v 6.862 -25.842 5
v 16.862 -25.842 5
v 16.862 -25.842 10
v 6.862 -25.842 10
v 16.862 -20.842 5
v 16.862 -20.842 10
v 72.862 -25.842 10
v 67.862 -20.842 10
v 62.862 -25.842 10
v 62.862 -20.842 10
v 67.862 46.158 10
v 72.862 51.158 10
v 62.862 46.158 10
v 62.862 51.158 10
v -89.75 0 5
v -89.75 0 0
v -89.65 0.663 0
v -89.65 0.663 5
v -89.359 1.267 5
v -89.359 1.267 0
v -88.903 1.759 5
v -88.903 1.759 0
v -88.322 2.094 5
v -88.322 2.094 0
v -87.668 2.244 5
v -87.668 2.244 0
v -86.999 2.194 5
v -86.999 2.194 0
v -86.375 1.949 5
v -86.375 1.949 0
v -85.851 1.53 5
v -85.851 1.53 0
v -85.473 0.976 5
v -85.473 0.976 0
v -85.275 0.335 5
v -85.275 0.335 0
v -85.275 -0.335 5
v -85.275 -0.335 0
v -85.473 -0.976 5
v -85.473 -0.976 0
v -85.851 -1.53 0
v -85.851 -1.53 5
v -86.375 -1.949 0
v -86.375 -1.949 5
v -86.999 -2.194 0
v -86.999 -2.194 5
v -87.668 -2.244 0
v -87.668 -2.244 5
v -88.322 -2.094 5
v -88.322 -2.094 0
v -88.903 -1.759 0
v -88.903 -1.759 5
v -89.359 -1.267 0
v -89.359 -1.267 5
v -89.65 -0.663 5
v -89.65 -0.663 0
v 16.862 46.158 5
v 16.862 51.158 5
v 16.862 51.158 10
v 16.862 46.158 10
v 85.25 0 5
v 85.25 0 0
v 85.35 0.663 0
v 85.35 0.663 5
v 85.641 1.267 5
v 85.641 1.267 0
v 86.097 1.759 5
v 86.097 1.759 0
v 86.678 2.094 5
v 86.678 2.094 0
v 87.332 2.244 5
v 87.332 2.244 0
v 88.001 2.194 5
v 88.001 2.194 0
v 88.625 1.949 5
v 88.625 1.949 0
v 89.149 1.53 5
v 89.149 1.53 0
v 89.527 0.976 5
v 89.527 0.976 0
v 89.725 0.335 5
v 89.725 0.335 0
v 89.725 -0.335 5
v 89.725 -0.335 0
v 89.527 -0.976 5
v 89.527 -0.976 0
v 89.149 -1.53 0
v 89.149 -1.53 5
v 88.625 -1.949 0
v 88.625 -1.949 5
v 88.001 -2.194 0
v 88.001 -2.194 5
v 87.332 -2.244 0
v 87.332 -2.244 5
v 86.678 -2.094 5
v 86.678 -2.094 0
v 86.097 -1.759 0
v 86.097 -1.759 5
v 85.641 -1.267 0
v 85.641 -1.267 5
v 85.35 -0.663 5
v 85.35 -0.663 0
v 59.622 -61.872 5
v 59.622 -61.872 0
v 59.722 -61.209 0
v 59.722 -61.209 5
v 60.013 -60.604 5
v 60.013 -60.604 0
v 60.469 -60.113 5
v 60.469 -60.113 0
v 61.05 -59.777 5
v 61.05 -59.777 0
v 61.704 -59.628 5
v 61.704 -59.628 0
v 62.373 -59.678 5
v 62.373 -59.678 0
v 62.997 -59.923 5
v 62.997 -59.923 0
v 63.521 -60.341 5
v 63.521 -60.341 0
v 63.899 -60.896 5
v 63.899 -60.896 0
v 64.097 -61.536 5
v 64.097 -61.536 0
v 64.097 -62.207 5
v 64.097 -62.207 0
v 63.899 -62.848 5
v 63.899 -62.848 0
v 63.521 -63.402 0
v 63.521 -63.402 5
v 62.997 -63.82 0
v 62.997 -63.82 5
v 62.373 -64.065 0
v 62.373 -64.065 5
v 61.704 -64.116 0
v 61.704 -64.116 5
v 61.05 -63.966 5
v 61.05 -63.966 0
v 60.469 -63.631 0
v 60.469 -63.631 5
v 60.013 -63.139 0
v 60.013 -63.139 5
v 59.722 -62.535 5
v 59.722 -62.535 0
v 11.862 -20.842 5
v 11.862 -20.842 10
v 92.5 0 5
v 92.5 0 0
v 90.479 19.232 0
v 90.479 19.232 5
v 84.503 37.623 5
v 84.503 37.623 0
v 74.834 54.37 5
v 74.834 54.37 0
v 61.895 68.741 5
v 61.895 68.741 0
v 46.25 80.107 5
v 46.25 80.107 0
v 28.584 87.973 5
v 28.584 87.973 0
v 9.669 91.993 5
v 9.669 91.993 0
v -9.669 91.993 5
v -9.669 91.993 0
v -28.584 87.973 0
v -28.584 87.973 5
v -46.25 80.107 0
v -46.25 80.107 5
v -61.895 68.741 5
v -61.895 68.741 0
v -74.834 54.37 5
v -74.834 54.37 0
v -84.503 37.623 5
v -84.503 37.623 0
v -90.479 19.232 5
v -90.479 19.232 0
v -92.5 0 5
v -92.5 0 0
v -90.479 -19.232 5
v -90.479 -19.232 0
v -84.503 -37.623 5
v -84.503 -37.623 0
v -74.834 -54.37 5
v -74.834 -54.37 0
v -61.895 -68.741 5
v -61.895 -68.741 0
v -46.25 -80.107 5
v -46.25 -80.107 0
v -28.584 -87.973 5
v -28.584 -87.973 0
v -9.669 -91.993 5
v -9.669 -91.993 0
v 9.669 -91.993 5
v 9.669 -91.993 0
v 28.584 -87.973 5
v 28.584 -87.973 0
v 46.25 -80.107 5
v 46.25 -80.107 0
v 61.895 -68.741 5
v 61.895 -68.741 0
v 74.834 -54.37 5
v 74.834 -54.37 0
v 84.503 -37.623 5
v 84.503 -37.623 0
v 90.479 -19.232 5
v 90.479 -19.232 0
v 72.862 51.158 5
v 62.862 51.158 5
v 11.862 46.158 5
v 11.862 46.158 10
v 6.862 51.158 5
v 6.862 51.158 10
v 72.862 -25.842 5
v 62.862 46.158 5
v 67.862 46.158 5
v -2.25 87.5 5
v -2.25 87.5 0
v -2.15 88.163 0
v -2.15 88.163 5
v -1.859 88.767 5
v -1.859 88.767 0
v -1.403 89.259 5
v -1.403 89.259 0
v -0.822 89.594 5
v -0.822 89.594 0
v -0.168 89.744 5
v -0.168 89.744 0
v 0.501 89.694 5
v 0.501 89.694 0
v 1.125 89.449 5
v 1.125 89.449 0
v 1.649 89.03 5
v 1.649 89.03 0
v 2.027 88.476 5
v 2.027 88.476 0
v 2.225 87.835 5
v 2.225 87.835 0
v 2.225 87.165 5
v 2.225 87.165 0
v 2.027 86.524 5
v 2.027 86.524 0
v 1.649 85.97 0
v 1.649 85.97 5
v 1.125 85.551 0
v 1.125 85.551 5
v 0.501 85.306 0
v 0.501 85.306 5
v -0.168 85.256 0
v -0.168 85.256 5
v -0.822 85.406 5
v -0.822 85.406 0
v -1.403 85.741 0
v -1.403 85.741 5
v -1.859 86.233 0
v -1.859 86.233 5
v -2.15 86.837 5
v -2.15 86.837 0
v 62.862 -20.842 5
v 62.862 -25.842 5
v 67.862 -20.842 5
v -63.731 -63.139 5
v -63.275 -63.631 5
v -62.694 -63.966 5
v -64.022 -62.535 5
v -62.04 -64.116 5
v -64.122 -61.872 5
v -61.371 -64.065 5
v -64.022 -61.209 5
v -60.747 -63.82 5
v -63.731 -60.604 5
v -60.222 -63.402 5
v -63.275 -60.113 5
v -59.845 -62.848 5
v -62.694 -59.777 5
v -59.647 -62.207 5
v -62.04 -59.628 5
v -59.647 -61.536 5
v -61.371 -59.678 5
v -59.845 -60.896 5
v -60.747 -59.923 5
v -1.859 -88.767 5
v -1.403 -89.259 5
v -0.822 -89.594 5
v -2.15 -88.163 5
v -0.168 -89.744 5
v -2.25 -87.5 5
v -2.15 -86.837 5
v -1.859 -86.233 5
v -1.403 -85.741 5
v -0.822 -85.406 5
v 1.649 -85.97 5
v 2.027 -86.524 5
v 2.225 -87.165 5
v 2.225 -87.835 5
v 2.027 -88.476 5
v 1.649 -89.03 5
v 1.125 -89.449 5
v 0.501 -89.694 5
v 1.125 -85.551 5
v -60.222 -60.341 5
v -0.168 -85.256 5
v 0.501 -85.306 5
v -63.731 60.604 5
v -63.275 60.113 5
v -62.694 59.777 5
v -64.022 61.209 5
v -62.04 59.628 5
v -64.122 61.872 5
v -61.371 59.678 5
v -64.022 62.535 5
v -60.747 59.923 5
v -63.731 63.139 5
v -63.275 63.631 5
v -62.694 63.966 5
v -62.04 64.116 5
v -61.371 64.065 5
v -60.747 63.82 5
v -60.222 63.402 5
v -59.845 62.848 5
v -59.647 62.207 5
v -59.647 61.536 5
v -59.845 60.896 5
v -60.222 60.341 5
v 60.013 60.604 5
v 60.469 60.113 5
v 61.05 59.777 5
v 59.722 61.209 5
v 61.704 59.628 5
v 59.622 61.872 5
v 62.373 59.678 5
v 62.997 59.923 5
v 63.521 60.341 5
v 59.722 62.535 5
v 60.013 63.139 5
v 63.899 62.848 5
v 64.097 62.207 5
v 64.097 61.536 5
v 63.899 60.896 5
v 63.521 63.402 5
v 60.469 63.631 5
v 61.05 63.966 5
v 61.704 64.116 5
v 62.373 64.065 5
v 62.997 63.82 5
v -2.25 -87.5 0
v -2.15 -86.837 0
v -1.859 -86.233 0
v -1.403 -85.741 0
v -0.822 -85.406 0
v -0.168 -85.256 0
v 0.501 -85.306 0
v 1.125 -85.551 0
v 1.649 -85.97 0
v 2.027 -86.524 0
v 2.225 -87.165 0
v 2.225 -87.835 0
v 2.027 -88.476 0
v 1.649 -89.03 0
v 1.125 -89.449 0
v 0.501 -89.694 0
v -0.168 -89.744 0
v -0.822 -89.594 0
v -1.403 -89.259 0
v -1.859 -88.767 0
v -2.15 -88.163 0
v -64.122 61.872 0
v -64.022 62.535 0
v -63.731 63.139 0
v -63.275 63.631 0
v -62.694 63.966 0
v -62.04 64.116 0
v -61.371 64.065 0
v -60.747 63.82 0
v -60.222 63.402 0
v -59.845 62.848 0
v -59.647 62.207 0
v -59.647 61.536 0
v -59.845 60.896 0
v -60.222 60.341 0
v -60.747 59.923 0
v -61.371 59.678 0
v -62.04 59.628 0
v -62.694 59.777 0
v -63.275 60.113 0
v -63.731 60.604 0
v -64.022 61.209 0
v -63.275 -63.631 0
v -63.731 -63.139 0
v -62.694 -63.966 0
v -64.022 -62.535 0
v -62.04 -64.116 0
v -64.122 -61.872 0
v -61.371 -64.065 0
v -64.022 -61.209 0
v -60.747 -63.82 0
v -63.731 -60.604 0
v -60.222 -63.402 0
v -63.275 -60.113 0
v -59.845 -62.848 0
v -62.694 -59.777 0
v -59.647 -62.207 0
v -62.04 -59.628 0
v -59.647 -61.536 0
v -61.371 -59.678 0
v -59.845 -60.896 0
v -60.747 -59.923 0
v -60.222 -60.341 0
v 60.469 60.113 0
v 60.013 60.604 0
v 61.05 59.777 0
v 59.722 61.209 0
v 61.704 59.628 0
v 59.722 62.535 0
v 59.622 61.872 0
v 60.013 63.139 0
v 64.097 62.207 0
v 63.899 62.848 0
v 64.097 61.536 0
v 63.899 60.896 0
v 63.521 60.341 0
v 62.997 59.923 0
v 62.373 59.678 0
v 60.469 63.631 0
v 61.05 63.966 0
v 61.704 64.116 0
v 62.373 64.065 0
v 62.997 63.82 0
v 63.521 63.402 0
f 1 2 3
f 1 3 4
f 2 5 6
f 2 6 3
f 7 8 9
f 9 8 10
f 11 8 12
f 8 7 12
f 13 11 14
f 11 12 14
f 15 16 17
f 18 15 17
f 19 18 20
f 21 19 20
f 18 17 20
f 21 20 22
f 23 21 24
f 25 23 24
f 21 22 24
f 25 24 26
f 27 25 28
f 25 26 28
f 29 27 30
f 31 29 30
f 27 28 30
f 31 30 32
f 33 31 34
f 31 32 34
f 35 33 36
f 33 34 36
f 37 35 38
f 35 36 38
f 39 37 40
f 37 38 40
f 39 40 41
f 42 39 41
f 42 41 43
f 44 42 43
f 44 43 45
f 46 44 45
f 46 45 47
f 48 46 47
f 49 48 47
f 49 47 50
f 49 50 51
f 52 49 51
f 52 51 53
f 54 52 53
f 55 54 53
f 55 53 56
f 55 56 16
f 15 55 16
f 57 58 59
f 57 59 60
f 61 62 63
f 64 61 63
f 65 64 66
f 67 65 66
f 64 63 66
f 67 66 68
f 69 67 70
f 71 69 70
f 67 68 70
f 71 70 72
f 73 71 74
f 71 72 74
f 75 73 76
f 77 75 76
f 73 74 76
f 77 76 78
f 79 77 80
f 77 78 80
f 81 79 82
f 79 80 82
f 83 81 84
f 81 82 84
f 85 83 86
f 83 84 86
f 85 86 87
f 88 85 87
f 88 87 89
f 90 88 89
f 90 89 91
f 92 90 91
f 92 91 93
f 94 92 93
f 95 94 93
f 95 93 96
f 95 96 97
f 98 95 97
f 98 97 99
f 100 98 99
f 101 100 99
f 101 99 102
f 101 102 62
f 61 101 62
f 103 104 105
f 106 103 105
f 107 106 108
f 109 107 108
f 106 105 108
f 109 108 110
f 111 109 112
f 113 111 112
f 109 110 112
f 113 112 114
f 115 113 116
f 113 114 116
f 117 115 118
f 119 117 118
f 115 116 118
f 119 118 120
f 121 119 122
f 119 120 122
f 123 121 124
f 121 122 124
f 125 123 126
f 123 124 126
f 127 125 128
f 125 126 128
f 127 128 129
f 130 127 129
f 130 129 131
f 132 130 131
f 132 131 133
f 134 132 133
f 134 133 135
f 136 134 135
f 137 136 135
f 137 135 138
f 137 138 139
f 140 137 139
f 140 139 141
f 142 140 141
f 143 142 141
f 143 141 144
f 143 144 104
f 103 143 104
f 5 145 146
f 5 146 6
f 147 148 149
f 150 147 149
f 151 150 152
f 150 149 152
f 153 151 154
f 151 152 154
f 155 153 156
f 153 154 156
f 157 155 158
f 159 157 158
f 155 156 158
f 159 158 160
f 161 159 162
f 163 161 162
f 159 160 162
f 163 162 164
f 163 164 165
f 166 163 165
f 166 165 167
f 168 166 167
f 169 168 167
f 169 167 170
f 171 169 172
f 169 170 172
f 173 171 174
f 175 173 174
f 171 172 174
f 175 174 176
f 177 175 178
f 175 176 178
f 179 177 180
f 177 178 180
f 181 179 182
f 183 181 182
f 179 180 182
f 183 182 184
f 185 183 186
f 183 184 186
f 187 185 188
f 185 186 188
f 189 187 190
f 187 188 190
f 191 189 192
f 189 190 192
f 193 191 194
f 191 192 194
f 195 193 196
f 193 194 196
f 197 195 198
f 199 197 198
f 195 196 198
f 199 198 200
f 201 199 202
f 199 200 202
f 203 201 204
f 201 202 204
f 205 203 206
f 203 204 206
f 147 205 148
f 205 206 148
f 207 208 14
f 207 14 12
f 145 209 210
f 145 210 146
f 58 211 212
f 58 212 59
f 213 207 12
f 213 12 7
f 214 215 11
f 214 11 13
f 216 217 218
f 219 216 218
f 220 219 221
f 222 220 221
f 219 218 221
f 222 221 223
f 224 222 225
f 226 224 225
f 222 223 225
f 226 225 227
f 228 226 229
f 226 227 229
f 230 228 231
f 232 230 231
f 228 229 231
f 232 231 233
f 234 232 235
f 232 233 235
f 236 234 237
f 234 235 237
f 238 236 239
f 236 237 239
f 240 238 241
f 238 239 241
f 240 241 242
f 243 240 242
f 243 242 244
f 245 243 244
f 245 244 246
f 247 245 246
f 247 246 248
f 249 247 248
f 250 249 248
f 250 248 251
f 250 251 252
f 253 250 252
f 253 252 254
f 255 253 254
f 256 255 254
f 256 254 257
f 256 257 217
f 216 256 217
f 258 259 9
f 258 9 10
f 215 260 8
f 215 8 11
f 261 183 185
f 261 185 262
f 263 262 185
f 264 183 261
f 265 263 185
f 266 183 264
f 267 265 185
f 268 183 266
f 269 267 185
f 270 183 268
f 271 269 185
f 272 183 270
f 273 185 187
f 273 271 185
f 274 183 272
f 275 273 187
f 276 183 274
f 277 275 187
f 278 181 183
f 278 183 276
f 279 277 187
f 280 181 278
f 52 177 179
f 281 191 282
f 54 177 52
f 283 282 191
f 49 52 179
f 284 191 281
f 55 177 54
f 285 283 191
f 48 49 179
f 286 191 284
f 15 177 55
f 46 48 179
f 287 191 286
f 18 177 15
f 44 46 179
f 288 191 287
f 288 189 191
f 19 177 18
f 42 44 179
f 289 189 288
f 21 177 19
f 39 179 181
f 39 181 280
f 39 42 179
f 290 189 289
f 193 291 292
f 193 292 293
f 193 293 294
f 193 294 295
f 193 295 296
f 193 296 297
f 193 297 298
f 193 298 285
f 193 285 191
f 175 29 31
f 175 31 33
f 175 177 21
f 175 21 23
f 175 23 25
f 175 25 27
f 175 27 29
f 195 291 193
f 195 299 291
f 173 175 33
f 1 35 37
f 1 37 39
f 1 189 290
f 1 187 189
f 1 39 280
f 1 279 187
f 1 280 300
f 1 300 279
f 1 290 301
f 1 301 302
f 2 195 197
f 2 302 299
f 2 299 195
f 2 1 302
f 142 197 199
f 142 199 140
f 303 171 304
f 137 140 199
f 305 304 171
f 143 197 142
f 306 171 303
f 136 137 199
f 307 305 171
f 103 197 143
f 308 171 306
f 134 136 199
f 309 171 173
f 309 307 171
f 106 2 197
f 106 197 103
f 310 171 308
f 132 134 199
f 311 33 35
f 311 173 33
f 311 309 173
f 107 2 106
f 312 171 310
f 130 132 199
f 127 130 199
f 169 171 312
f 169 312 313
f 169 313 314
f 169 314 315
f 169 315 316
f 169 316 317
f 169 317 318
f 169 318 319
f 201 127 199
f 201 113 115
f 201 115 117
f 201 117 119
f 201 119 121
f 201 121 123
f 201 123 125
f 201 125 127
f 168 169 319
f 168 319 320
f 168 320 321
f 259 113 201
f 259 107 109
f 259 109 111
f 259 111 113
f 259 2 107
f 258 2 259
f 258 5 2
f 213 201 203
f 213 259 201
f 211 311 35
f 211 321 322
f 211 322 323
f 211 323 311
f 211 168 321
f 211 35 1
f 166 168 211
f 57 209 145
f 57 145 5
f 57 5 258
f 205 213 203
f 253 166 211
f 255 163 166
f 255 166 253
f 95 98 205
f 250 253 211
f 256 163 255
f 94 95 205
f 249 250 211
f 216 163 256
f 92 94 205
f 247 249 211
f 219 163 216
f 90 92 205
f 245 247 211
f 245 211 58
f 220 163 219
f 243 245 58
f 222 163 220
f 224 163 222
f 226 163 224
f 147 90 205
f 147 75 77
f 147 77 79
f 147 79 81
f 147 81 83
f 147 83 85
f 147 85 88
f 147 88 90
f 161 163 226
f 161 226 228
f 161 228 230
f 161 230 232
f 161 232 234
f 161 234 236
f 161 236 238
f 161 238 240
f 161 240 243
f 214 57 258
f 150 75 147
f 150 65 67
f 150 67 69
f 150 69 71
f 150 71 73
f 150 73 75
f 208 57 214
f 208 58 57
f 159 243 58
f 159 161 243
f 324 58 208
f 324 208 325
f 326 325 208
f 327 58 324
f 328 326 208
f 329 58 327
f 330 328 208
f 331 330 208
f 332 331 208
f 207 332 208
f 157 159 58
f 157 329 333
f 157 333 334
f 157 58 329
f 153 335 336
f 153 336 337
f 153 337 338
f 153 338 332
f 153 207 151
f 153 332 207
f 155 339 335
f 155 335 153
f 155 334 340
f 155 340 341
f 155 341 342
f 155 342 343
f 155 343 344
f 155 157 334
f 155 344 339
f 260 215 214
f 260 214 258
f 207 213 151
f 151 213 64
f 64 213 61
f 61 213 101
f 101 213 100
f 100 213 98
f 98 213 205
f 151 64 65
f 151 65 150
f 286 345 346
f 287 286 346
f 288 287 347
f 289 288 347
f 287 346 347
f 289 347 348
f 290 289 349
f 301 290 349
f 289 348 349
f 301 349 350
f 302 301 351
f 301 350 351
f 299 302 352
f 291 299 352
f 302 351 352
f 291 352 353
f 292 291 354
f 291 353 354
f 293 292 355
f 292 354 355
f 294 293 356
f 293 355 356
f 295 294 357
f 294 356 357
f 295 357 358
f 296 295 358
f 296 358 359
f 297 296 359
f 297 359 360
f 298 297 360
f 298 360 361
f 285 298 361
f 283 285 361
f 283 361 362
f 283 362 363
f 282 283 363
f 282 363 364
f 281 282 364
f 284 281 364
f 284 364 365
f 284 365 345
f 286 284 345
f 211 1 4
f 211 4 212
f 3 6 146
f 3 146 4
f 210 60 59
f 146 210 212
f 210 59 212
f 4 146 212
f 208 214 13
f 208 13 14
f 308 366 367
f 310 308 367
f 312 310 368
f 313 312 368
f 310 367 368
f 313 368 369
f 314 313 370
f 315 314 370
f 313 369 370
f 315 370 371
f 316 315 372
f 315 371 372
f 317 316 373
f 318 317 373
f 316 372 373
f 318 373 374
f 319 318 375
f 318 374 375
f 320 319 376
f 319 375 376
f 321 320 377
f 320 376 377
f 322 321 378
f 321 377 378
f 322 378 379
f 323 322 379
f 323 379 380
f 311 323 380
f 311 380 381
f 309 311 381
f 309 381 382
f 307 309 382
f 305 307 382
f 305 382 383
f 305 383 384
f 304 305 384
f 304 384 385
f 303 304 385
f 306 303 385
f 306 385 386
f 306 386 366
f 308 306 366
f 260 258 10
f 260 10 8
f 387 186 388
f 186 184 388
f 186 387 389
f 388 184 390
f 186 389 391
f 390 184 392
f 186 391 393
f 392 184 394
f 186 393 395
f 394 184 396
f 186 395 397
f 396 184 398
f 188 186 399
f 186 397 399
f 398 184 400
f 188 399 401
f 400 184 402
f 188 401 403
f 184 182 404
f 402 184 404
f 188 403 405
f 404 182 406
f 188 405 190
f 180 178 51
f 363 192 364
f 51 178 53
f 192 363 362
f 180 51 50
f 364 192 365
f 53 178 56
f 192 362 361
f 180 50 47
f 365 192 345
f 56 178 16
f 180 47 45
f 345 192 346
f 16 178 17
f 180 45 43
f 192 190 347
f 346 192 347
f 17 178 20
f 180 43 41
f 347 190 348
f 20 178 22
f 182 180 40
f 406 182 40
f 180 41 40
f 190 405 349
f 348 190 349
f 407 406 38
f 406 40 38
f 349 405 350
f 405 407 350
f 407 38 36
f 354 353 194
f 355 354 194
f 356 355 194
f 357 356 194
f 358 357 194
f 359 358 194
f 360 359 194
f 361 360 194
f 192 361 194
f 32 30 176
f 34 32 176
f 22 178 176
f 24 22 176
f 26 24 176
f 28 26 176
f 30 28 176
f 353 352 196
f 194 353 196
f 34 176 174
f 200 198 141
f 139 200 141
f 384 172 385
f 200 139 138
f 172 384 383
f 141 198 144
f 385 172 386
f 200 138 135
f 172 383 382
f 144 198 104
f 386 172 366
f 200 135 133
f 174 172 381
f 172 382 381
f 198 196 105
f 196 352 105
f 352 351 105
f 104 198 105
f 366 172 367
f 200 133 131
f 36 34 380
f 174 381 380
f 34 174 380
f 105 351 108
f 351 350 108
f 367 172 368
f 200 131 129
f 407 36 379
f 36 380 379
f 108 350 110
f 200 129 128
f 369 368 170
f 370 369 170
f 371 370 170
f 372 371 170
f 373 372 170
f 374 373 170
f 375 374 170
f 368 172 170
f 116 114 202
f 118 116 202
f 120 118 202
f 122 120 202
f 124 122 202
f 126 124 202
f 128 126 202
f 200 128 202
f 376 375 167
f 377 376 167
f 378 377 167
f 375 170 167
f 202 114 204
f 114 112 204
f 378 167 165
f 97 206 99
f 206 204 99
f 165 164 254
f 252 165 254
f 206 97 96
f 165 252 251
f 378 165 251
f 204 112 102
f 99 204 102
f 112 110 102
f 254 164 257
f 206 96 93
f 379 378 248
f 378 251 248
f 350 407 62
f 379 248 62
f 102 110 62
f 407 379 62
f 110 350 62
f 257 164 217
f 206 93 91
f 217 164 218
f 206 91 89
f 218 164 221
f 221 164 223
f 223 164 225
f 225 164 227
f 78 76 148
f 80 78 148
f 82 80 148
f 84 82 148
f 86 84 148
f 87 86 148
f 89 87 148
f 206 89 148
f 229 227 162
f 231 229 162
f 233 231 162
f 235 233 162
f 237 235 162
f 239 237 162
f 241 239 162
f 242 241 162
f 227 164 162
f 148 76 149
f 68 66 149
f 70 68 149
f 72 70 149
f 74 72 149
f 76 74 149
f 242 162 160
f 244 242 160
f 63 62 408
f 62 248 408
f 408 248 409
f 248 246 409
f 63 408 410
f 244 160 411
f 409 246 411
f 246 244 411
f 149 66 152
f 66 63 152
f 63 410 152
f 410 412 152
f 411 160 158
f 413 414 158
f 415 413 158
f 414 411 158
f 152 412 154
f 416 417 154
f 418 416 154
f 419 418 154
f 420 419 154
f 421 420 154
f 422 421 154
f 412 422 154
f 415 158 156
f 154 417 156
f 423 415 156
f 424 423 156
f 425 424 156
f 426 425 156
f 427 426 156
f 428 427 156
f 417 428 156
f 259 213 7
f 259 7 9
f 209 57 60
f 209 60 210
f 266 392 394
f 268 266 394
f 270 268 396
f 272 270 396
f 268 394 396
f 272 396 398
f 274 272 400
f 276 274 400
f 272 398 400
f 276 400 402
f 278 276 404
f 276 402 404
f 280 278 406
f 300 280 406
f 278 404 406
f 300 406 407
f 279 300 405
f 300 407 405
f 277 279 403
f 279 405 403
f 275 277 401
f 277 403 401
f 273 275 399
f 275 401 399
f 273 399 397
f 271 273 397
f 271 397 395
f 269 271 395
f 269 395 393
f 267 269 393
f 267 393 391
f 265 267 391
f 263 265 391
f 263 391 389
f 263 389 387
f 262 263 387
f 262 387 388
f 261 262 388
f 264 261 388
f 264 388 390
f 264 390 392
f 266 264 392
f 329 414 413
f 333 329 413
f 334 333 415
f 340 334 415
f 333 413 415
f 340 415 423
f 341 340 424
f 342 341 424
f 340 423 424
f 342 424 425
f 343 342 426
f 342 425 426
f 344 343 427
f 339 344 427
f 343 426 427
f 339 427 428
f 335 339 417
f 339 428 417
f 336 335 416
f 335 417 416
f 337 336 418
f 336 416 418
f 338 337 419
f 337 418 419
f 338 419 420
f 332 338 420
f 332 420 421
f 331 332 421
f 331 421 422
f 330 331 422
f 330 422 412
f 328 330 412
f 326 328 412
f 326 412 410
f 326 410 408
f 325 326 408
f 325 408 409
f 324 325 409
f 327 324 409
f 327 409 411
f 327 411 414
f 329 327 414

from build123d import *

# Parameters (mm, degrees)
SKETCH1_R           = 92.5
BOSS_EXTRUDE1_DEPTH = 5
BOSS_EXTRUDE2_DEPTH = 5
CUT_EXTRUDE4_REACH  = 12
SKETCH13_R          = 2.25


with BuildPart() as part:
    # Sketch1 → Boss-Extrude1 (new body)
    with BuildSketch(Plane.XY):
        Circle(SKETCH1_R)
    extrude(amount=BOSS_EXTRUDE1_DEPTH)

    # Sketch12 → Boss-Extrude2 (add)
    with BuildSketch(Plane.XY.offset(5)):
        Polygon((62.861769108, -20.84153395), (67.861769108, -20.84153395), (67.861769108, 46.15846605), (62.861769108, 46.15846605), (62.861769108, 51.15846605), (72.861769108, 51.15846605), (72.861769108, -25.84153395), (62.861769108, -25.84153395), align=None)
        Polygon((11.861769105, 46.15846605), (11.861769105, -20.84153395), (16.861769105, -20.84153395), (16.861769105, -25.84153395), (6.861769105, -25.84153395), (6.861769105, 51.15846605), (16.861769105, 51.15846605), (16.861769105, 46.15846605), align=None)
    extrude(amount=BOSS_EXTRUDE2_DEPTH)

    # Sketch13 → Cut-Extrude4 (cut, up to next)
    with BuildSketch(Plane(origin=(0, 0, 0), x_dir=(-1, 0, 0), z_dir=(0, 0, -1)), mode=Mode.PRIVATE) as cut_extrude4_sk1:
        with Locations((-87.5, 0)):
            Circle(SKETCH13_R)
    cut_extrude4_tool1 = extrude(cut_extrude4_sk1.sketch, amount=-CUT_EXTRUDE4_REACH, mode=Mode.PRIVATE) & part.part
    add(cut_extrude4_tool1.solids().sort_by_distance((87.5, 0, 0))[0], mode=Mode.SUBTRACT)
    # Sketch13 → Cut-Extrude4 (cut, up to next)
    with BuildSketch(Plane(origin=(0, 0, 0), x_dir=(-1, 0, 0), z_dir=(0, 0, -1)), mode=Mode.PRIVATE) as cut_extrude4_sk2:
        with Locations((-61.871843354, 61.871843354)):
            Circle(SKETCH13_R)
    cut_extrude4_tool2 = extrude(cut_extrude4_sk2.sketch, amount=-CUT_EXTRUDE4_REACH, mode=Mode.PRIVATE) & part.part
    add(cut_extrude4_tool2.solids().sort_by_distance((61.871843, 61.871843, 0))[0], mode=Mode.SUBTRACT)
    # Sketch13 → Cut-Extrude4 (cut, up to next)
    with BuildSketch(Plane(origin=(0, 0, 0), x_dir=(-1, 0, 0), z_dir=(0, 0, -1)), mode=Mode.PRIVATE) as cut_extrude4_sk3:
        with Locations((0, 87.5)):
            Circle(SKETCH13_R)
    cut_extrude4_tool3 = extrude(cut_extrude4_sk3.sketch, amount=-CUT_EXTRUDE4_REACH, mode=Mode.PRIVATE) & part.part
    add(cut_extrude4_tool3.solids().sort_by_distance((0, 87.5, 0))[0], mode=Mode.SUBTRACT)
    # Sketch13 → Cut-Extrude4 (cut, up to next)
    with BuildSketch(Plane(origin=(0, 0, 0), x_dir=(-1, 0, 0), z_dir=(0, 0, -1)), mode=Mode.PRIVATE) as cut_extrude4_sk4:
        with Locations((61.871843354, 61.871843354)):
            Circle(SKETCH13_R)
    cut_extrude4_tool4 = extrude(cut_extrude4_sk4.sketch, amount=-CUT_EXTRUDE4_REACH, mode=Mode.PRIVATE) & part.part
    add(cut_extrude4_tool4.solids().sort_by_distance((-61.871843, 61.871843, 0))[0], mode=Mode.SUBTRACT)
    # Sketch13 → Cut-Extrude4 (cut, up to next)
    with BuildSketch(Plane(origin=(0, 0, 0), x_dir=(-1, 0, 0), z_dir=(0, 0, -1)), mode=Mode.PRIVATE) as cut_extrude4_sk5:
        with Locations((87.5, 0)):
            Circle(SKETCH13_R)
    cut_extrude4_tool5 = extrude(cut_extrude4_sk5.sketch, amount=-CUT_EXTRUDE4_REACH, mode=Mode.PRIVATE) & part.part
    add(cut_extrude4_tool5.solids().sort_by_distance((-87.5, 0, 0))[0], mode=Mode.SUBTRACT)
    # Sketch13 → Cut-Extrude4 (cut, up to next)
    with BuildSketch(Plane(origin=(0, 0, 0), x_dir=(-1, 0, 0), z_dir=(0, 0, -1)), mode=Mode.PRIVATE) as cut_extrude4_sk6:
        with Locations((61.871843354, -61.871843354)):
            Circle(SKETCH13_R)
    cut_extrude4_tool6 = extrude(cut_extrude4_sk6.sketch, amount=-CUT_EXTRUDE4_REACH, mode=Mode.PRIVATE) & part.part
    add(cut_extrude4_tool6.solids().sort_by_distance((-61.871843, -61.871843, 0))[0], mode=Mode.SUBTRACT)
    # Sketch13 → Cut-Extrude4 (cut, up to next)
    with BuildSketch(Plane(origin=(0, 0, 0), x_dir=(-1, 0, 0), z_dir=(0, 0, -1)), mode=Mode.PRIVATE) as cut_extrude4_sk7:
        with Locations((0, -87.5)):
            Circle(SKETCH13_R)
    cut_extrude4_tool7 = extrude(cut_extrude4_sk7.sketch, amount=-CUT_EXTRUDE4_REACH, mode=Mode.PRIVATE) & part.part
    add(cut_extrude4_tool7.solids().sort_by_distance((0, -87.5, 0))[0], mode=Mode.SUBTRACT)
    # Sketch13 → Cut-Extrude4 (cut, up to next)
    with BuildSketch(Plane(origin=(0, 0, 0), x_dir=(-1, 0, 0), z_dir=(0, 0, -1)), mode=Mode.PRIVATE) as cut_extrude4_sk8:
        with Locations((-61.871843354, -61.871843354)):
            Circle(SKETCH13_R)
    cut_extrude4_tool8 = extrude(cut_extrude4_sk8.sketch, amount=-CUT_EXTRUDE4_REACH, mode=Mode.PRIVATE) & part.part
    add(cut_extrude4_tool8.solids().sort_by_distance((61.871843, -61.871843, 0))[0], mode=Mode.SUBTRACT)


solid = part.part
